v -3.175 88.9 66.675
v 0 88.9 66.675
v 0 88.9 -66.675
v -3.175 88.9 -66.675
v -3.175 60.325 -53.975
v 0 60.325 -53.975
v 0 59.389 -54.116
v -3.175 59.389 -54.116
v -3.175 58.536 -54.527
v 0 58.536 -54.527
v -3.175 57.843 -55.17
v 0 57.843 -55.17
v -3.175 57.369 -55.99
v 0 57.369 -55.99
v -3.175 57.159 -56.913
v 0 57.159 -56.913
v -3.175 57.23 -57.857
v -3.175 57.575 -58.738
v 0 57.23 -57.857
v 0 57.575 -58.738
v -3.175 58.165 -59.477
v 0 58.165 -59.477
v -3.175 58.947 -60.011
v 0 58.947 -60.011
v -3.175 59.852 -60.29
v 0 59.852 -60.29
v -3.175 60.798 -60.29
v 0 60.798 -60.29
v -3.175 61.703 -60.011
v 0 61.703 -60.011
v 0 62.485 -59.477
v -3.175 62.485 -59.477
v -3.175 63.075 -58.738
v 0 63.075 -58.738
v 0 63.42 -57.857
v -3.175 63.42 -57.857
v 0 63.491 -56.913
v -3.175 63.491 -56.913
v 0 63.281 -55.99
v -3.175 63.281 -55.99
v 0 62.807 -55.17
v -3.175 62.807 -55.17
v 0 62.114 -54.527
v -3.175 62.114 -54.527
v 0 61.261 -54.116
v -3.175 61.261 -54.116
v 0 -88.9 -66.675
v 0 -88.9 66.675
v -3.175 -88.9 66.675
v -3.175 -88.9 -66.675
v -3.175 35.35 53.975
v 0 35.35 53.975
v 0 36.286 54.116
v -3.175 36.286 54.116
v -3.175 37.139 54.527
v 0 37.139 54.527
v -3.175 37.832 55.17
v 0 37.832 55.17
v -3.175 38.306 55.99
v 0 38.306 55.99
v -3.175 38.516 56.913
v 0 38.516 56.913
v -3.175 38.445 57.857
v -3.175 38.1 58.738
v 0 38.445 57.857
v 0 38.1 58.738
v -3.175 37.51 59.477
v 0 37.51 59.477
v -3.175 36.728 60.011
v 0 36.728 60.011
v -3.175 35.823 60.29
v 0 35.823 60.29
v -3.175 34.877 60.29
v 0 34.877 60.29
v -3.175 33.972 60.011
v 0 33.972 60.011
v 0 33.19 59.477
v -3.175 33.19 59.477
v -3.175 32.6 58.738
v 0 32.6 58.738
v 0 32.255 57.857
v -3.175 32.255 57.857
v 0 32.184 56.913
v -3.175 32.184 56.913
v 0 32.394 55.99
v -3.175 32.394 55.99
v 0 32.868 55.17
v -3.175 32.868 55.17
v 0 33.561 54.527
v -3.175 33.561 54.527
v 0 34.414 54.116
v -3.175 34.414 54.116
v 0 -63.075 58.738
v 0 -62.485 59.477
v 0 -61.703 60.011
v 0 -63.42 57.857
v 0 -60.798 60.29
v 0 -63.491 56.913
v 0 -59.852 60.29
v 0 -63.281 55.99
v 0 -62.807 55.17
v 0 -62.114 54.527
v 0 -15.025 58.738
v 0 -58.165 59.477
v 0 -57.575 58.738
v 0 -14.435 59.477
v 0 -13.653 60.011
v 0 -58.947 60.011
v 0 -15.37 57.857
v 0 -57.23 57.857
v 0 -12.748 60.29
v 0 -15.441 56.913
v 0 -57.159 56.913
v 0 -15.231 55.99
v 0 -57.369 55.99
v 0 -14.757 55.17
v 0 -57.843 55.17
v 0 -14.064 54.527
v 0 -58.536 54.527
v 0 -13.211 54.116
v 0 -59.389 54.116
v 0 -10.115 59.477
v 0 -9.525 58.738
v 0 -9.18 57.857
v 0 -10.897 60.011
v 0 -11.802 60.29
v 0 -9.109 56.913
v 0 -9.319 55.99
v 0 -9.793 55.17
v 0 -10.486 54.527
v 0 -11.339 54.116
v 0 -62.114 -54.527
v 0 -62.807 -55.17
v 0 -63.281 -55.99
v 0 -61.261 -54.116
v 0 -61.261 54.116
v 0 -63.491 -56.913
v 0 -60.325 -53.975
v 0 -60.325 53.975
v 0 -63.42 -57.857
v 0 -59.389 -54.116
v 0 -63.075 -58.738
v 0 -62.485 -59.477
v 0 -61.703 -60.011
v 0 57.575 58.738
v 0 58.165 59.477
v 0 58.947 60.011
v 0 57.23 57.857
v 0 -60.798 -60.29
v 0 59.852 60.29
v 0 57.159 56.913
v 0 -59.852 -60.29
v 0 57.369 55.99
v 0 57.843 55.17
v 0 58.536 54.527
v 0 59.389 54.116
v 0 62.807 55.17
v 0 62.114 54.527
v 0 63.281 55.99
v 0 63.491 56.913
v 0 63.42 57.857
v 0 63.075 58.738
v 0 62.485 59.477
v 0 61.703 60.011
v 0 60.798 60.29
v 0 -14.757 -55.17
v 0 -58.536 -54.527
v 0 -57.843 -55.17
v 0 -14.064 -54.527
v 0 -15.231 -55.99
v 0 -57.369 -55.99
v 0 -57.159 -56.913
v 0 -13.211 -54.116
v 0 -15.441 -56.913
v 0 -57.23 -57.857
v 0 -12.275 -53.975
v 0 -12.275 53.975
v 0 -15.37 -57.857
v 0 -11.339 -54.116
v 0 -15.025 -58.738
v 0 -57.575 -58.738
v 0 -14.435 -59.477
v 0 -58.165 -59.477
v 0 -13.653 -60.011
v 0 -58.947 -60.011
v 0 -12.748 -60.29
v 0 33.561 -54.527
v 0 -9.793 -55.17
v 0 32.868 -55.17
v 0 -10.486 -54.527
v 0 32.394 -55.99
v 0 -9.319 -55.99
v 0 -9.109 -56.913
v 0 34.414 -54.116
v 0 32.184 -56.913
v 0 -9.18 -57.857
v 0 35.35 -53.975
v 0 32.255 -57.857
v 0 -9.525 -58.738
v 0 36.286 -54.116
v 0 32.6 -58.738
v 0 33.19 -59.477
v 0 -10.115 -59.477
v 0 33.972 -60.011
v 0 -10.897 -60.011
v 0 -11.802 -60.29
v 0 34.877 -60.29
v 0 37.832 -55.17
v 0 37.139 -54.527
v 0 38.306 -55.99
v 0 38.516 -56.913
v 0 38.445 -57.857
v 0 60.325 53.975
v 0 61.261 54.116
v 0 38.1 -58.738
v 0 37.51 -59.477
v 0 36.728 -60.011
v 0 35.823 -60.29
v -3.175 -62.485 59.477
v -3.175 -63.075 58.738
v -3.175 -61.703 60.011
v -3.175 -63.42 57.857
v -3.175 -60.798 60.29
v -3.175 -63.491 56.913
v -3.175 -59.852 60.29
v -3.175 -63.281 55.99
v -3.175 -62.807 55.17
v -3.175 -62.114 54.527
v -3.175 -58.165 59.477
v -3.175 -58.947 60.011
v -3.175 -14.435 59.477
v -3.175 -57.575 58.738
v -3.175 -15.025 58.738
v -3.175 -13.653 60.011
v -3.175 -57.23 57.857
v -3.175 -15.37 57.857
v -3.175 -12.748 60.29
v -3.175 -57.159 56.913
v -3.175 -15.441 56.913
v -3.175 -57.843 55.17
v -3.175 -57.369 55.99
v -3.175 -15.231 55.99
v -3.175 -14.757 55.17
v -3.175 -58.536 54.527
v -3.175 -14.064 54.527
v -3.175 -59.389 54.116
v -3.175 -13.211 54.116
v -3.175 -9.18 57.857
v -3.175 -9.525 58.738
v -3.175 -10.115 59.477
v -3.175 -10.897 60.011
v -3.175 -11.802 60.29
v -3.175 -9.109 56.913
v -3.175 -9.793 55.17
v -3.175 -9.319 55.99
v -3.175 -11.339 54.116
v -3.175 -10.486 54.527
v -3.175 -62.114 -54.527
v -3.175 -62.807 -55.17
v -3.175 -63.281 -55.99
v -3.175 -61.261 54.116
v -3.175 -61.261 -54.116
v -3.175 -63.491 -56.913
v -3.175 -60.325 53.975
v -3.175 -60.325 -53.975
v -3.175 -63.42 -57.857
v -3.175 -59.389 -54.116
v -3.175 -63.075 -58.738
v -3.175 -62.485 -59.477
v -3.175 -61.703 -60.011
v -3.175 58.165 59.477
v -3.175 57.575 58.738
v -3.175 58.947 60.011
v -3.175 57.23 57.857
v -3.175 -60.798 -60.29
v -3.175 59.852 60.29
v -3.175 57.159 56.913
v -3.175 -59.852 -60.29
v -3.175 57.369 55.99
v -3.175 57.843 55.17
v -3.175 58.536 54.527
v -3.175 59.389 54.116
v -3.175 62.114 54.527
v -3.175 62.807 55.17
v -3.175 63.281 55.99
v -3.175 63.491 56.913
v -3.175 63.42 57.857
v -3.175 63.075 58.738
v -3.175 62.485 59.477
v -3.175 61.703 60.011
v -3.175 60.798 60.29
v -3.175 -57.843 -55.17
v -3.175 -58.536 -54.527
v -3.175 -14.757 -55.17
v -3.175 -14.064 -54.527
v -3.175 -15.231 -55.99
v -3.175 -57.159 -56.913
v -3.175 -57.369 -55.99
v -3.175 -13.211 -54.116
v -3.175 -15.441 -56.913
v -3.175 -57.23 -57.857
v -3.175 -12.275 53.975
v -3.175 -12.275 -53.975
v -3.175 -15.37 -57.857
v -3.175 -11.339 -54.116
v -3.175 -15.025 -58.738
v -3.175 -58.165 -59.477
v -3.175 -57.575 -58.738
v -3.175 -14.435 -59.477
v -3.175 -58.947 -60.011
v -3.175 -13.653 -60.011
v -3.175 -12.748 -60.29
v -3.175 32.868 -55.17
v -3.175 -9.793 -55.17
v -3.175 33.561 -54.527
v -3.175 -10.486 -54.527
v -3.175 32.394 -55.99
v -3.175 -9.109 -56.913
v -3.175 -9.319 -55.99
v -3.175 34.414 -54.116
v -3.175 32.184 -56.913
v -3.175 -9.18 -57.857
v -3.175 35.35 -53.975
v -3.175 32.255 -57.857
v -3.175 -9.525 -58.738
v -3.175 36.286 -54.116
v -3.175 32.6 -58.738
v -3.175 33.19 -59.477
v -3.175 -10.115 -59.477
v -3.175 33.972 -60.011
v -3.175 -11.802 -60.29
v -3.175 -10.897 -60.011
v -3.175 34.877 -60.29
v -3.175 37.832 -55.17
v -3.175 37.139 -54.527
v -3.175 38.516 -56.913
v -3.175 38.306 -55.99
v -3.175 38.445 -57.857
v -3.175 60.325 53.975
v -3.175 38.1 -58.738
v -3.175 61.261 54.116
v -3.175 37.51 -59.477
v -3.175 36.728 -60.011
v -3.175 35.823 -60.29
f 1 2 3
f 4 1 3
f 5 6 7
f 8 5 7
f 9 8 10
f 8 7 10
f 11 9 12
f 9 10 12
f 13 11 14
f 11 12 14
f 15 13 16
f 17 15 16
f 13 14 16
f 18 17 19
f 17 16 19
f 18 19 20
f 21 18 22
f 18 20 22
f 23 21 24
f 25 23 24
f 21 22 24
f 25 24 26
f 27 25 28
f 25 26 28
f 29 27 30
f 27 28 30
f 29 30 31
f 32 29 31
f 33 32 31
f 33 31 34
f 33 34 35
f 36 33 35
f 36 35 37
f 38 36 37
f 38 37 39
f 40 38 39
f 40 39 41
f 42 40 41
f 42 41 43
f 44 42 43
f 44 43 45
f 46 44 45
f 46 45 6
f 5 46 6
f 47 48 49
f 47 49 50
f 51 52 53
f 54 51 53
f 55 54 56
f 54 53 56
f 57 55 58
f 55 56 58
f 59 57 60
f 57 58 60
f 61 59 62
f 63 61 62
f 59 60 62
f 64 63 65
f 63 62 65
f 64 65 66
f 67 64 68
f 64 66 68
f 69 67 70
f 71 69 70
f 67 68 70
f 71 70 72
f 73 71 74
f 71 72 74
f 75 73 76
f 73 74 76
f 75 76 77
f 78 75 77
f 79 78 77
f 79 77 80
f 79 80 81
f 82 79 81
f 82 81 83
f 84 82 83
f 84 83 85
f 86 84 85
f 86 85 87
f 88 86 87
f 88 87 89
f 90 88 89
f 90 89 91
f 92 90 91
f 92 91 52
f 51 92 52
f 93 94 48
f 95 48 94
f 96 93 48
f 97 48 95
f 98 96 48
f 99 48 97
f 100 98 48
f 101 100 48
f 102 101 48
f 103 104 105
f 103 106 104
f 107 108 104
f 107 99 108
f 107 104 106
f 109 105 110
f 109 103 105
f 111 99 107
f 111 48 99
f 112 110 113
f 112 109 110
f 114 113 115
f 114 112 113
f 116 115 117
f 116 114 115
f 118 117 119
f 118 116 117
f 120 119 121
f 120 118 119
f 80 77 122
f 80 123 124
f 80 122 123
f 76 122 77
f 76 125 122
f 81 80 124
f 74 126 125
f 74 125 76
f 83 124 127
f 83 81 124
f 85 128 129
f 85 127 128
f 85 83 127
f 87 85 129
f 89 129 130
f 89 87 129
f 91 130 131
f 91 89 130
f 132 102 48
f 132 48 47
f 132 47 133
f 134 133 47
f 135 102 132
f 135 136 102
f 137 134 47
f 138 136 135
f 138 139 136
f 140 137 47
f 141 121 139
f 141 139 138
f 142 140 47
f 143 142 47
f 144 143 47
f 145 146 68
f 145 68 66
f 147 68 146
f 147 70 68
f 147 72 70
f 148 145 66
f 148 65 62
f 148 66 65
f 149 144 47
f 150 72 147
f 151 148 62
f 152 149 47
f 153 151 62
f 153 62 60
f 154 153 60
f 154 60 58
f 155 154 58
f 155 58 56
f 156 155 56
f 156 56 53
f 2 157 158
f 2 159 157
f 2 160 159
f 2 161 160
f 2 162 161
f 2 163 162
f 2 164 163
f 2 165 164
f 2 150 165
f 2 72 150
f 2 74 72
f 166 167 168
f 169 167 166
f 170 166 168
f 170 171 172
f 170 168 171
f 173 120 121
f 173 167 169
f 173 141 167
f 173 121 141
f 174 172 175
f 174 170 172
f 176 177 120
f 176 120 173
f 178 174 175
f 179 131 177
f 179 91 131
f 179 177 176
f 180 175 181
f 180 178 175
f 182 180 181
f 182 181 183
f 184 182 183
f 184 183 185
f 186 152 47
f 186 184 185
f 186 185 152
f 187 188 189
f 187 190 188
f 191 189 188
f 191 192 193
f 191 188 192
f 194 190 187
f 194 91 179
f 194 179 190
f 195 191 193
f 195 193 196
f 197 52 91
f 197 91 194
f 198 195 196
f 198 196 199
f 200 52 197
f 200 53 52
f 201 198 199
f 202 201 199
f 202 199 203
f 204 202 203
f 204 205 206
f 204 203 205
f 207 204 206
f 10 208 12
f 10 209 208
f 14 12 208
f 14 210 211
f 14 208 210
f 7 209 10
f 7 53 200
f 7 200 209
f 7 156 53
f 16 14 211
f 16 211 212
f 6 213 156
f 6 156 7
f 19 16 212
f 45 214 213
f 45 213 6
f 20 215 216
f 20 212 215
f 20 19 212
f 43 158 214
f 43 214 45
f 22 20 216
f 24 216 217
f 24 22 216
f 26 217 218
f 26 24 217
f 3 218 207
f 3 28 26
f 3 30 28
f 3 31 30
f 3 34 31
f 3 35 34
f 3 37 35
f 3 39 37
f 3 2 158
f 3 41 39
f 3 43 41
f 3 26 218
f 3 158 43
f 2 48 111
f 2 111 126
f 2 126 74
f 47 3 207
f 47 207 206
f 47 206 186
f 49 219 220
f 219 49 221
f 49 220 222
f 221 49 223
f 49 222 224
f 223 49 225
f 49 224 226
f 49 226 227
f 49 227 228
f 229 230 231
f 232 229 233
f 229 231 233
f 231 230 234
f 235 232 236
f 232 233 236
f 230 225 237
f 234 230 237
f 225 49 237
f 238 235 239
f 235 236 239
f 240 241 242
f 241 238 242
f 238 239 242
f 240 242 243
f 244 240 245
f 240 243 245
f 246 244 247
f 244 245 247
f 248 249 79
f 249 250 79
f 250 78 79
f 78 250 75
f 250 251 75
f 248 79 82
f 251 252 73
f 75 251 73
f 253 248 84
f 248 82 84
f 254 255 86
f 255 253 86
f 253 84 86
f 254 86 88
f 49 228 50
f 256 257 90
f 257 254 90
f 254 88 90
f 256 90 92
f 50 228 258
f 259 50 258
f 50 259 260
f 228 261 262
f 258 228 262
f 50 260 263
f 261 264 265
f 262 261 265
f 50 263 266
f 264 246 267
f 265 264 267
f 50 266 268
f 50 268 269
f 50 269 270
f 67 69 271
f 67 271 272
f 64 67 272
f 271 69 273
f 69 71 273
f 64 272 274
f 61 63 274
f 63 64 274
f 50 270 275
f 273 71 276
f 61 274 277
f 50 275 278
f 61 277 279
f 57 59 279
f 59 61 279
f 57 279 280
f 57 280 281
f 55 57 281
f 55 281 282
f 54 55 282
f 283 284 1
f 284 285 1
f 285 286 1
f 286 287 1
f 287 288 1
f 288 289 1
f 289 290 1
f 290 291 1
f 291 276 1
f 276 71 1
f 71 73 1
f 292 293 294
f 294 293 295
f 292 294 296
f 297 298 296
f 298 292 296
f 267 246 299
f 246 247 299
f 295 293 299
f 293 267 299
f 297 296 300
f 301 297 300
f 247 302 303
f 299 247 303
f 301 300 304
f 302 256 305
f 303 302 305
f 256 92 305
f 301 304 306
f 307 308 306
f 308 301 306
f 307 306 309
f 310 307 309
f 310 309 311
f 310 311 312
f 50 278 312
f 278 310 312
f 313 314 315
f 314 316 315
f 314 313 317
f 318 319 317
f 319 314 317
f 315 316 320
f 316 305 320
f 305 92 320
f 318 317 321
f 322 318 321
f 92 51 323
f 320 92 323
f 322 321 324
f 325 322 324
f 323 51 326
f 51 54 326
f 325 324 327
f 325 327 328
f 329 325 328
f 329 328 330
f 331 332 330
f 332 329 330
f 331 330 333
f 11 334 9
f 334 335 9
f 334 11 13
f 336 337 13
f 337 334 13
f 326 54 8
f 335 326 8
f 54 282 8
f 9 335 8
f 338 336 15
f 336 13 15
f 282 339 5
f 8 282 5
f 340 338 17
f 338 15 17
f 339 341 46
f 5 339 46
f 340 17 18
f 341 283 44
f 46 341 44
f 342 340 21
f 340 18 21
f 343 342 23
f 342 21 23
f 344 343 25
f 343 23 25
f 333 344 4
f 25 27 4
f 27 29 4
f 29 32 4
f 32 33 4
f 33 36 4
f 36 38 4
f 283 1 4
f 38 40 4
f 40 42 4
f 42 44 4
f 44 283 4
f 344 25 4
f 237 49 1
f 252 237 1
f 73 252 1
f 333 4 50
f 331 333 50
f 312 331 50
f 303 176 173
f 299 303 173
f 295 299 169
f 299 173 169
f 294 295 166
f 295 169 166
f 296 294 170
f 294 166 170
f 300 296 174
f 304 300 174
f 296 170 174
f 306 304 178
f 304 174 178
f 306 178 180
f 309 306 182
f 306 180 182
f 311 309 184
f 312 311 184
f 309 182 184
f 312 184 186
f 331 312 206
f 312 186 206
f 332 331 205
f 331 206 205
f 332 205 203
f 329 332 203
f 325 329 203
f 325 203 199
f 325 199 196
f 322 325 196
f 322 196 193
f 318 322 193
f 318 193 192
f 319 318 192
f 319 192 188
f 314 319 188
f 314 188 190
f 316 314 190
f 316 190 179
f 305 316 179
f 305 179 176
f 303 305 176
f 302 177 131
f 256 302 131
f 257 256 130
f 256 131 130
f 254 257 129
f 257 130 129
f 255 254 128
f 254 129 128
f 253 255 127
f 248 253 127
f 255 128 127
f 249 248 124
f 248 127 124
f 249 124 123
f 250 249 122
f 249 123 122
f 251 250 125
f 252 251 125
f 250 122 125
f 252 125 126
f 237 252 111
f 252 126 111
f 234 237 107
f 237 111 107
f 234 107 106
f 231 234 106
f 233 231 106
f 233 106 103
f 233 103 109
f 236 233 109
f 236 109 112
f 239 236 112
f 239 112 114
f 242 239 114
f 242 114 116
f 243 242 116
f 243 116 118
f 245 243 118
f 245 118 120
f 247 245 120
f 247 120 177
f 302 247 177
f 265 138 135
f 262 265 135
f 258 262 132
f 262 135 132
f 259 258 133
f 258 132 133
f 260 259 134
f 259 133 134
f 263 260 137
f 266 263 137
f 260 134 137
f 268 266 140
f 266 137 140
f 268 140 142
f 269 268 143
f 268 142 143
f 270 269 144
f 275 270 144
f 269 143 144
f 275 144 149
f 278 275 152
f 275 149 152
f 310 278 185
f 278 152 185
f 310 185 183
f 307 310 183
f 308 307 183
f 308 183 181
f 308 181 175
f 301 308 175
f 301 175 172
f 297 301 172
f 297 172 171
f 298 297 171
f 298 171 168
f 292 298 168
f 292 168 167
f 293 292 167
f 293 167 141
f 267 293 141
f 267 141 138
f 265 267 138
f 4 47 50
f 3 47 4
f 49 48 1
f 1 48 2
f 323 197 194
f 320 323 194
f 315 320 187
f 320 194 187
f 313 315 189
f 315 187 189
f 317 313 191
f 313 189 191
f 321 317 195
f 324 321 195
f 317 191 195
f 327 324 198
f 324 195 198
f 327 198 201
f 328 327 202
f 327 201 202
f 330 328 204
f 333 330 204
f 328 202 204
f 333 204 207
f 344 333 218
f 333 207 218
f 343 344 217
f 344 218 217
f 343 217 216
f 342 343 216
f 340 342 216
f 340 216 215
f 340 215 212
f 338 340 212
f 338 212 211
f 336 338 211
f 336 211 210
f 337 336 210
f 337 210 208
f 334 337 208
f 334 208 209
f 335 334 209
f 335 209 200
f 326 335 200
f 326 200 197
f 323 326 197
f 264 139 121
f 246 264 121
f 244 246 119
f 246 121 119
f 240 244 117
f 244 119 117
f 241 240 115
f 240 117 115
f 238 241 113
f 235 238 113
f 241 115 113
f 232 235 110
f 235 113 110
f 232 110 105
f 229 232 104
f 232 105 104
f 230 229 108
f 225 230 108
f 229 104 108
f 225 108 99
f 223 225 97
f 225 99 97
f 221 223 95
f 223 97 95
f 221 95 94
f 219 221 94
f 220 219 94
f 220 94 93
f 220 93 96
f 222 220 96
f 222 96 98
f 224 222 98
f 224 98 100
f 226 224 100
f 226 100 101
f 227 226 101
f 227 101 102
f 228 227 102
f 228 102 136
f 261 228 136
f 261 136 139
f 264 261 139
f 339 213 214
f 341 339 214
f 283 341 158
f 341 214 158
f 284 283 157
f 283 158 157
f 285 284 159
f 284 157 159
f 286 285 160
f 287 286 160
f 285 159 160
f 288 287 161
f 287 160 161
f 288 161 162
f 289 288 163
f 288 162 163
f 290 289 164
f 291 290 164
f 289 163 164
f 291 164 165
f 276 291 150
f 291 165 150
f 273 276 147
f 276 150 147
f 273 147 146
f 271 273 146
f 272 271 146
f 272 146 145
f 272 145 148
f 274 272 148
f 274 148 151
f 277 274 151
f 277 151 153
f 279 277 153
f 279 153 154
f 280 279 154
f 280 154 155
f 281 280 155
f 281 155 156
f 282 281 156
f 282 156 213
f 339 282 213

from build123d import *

# Parameters (mm, degrees)
SKETCH1_W           = 133.35
SKETCH1_H           = 177.8
BOSS_EXTRUDE1_DEPTH = 3.175
SKETCH2_R           = 3.175
CUT_EXTRUDE1_DEPTH  = 112.17034789


with BuildPart() as part:
    # Sketch1 → Boss-Extrude1 (new body)
    with BuildSketch(Plane(origin=(0, 0, 0), x_dir=(0, 0, -1), z_dir=(1, 0, 0))):
        Rectangle(SKETCH1_W, SKETCH1_H)
    extrude(amount=-BOSS_EXTRUDE1_DEPTH)

    # Sketch2 → Cut-Extrude1 (cut, through all)
    with BuildSketch(Plane(origin=(0, 0, 0), x_dir=(0, 0, -1), z_dir=(1, 0, 0))):
        with Locations((-57.15, -60.325)):
            Circle(SKETCH2_R)
        with Locations((-57.15, -12.275000088)):
            Circle(SKETCH2_R)
        with Locations(Location((57.15, -12.275000088, 0), (0, 0, 180))):
            Circle(SKETCH2_R)
        with Locations(Location((57.15, -60.325, 0), (0, 0, 180))):
            Circle(SKETCH2_R)
        with Locations((-57.15, 60.325)):
            Circle(SKETCH2_R)
        with Locations((-57.15, 35.349999912)):
            Circle(SKETCH2_R)
        with Locations(Location((57.15, 35.349999912, 0), (0, 0, 180))):
            Circle(SKETCH2_R)
        with Locations(Location((57.15, 60.325, 0), (0, 0, 180))):
            Circle(SKETCH2_R)
    extrude(amount=-CUT_EXTRUDE1_DEPTH, mode=Mode.SUBTRACT)


solid = part.part
